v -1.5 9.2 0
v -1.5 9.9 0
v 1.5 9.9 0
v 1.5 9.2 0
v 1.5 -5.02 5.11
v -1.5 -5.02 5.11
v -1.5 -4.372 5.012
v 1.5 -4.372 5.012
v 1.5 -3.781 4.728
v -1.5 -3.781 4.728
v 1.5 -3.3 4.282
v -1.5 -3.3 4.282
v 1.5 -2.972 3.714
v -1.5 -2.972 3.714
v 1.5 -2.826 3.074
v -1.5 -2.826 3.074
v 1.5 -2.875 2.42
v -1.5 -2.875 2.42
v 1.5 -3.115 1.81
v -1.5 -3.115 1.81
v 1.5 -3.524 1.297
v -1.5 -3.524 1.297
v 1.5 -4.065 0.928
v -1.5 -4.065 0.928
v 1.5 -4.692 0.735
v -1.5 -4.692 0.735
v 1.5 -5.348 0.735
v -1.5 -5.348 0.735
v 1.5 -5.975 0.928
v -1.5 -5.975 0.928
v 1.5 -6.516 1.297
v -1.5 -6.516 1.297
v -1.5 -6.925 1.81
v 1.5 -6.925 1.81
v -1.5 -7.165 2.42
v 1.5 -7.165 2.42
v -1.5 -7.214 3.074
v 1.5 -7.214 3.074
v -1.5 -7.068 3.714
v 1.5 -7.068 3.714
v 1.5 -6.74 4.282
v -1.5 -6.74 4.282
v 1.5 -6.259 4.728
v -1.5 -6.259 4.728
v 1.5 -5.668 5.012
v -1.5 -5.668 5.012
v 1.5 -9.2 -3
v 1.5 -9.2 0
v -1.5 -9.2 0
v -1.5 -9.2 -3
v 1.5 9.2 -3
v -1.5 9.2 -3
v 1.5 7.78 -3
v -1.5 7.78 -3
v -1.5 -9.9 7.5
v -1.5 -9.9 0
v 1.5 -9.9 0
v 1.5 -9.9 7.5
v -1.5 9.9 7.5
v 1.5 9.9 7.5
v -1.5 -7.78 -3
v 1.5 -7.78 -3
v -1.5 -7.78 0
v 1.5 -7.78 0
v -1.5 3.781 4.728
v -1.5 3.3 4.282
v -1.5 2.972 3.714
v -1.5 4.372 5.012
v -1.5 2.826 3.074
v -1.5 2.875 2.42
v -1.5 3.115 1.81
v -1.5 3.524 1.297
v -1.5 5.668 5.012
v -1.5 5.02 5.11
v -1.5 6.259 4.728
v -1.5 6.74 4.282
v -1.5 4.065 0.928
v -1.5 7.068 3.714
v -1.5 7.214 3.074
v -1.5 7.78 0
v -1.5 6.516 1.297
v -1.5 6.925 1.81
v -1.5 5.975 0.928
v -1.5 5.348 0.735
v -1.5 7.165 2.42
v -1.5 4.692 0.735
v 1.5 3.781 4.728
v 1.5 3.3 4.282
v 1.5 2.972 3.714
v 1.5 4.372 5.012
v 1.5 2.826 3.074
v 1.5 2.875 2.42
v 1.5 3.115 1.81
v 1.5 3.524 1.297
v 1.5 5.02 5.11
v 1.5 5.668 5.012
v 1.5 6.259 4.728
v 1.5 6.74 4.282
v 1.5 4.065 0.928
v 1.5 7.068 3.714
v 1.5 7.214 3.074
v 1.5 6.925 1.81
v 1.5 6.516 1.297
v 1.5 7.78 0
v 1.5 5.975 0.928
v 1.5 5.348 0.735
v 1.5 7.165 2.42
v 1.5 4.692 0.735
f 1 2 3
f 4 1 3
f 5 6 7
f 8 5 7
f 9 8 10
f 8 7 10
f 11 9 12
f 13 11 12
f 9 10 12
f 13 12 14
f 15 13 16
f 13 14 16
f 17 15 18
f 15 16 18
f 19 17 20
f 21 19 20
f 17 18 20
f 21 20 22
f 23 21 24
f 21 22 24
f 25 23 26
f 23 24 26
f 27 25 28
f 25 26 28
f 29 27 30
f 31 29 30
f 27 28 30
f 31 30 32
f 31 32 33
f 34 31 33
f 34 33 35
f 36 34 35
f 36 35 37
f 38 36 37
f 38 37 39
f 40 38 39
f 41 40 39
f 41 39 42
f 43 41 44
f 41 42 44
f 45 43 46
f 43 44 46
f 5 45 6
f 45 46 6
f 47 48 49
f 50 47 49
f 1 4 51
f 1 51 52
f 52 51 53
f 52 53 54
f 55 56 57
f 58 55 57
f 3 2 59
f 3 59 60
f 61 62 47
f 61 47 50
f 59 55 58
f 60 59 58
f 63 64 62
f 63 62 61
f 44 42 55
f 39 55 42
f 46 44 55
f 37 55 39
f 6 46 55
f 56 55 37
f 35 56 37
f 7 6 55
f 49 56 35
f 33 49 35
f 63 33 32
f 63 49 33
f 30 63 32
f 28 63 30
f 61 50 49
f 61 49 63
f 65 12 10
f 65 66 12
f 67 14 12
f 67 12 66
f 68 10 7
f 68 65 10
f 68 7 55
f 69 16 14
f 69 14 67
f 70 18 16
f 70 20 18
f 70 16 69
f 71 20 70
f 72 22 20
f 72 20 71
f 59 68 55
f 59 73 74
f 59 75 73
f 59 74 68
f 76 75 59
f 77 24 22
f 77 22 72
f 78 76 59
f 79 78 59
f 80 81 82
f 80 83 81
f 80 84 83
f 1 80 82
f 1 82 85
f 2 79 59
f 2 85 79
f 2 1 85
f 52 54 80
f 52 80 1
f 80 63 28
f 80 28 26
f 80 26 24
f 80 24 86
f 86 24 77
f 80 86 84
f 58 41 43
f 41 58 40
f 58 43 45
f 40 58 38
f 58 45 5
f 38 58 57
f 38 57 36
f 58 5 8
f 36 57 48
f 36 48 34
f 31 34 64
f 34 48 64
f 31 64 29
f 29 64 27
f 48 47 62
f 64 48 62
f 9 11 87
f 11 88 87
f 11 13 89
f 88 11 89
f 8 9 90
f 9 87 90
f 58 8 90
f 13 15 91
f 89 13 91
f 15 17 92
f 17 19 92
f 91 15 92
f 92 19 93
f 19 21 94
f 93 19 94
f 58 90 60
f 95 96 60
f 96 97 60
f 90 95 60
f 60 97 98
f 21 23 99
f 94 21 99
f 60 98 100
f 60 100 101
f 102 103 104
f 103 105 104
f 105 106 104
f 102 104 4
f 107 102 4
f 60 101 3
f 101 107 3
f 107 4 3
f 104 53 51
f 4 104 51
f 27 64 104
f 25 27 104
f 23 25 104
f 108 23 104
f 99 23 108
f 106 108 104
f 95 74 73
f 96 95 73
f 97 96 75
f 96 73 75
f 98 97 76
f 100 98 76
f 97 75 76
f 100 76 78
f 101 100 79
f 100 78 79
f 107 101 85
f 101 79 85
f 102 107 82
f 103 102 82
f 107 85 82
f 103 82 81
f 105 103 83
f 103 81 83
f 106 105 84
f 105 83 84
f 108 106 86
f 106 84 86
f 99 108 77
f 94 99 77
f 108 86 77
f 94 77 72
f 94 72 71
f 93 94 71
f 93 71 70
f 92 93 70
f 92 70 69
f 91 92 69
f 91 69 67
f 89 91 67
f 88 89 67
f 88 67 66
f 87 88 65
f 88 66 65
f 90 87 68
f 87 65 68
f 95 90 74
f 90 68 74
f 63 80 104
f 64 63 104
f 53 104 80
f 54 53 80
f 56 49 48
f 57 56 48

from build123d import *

# Parameters (mm, degrees)
CROQUIS1_W              = 3
CROQUIS1_H              = 19.8
SALIENTE_EXTRUIR1_DEPTH = 7.5
CROQUIS2_W              = 3
CROQUIS2_H              = 1.42
SALIENTE_EXTRUIR2_DEPTH = 3
CROQUIS3_R              = 2.2
CORTAR_EXTRUIR1_DEPTH   = 3


with BuildPart() as part:
    # Croquis1 → Saliente-Extruir1 (new body)
    with BuildSketch(Plane.XY):
        Rectangle(CROQUIS1_W, CROQUIS1_H)
    extrude(amount=SALIENTE_EXTRUIR1_DEPTH)

    # Croquis2 → Saliente-Extruir2 (add)
    with BuildSketch(Plane(origin=(0, 0, 0), x_dir=(-1, 0, 0), z_dir=(0, 0, -1))):
        with Locations((0, 8.49)):
            Rectangle(CROQUIS2_W, CROQUIS2_H)
        with Locations((0, -8.49)):
            Rectangle(CROQUIS2_W, CROQUIS2_H)
    extrude(amount=SALIENTE_EXTRUIR2_DEPTH)

    # Croquis3 → Cortar-Extruir1 (cut)
    with BuildSketch(Plane.ZY.offset(1.5)):
        with Locations((2.91, -5.02)):
            Circle(CROQUIS3_R)
        with Locations((2.91, 5.02)):
            Circle(CROQUIS3_R)
    extrude(amount=-CORTAR_EXTRUIR1_DEPTH, mode=Mode.SUBTRACT)


solid = part.part
